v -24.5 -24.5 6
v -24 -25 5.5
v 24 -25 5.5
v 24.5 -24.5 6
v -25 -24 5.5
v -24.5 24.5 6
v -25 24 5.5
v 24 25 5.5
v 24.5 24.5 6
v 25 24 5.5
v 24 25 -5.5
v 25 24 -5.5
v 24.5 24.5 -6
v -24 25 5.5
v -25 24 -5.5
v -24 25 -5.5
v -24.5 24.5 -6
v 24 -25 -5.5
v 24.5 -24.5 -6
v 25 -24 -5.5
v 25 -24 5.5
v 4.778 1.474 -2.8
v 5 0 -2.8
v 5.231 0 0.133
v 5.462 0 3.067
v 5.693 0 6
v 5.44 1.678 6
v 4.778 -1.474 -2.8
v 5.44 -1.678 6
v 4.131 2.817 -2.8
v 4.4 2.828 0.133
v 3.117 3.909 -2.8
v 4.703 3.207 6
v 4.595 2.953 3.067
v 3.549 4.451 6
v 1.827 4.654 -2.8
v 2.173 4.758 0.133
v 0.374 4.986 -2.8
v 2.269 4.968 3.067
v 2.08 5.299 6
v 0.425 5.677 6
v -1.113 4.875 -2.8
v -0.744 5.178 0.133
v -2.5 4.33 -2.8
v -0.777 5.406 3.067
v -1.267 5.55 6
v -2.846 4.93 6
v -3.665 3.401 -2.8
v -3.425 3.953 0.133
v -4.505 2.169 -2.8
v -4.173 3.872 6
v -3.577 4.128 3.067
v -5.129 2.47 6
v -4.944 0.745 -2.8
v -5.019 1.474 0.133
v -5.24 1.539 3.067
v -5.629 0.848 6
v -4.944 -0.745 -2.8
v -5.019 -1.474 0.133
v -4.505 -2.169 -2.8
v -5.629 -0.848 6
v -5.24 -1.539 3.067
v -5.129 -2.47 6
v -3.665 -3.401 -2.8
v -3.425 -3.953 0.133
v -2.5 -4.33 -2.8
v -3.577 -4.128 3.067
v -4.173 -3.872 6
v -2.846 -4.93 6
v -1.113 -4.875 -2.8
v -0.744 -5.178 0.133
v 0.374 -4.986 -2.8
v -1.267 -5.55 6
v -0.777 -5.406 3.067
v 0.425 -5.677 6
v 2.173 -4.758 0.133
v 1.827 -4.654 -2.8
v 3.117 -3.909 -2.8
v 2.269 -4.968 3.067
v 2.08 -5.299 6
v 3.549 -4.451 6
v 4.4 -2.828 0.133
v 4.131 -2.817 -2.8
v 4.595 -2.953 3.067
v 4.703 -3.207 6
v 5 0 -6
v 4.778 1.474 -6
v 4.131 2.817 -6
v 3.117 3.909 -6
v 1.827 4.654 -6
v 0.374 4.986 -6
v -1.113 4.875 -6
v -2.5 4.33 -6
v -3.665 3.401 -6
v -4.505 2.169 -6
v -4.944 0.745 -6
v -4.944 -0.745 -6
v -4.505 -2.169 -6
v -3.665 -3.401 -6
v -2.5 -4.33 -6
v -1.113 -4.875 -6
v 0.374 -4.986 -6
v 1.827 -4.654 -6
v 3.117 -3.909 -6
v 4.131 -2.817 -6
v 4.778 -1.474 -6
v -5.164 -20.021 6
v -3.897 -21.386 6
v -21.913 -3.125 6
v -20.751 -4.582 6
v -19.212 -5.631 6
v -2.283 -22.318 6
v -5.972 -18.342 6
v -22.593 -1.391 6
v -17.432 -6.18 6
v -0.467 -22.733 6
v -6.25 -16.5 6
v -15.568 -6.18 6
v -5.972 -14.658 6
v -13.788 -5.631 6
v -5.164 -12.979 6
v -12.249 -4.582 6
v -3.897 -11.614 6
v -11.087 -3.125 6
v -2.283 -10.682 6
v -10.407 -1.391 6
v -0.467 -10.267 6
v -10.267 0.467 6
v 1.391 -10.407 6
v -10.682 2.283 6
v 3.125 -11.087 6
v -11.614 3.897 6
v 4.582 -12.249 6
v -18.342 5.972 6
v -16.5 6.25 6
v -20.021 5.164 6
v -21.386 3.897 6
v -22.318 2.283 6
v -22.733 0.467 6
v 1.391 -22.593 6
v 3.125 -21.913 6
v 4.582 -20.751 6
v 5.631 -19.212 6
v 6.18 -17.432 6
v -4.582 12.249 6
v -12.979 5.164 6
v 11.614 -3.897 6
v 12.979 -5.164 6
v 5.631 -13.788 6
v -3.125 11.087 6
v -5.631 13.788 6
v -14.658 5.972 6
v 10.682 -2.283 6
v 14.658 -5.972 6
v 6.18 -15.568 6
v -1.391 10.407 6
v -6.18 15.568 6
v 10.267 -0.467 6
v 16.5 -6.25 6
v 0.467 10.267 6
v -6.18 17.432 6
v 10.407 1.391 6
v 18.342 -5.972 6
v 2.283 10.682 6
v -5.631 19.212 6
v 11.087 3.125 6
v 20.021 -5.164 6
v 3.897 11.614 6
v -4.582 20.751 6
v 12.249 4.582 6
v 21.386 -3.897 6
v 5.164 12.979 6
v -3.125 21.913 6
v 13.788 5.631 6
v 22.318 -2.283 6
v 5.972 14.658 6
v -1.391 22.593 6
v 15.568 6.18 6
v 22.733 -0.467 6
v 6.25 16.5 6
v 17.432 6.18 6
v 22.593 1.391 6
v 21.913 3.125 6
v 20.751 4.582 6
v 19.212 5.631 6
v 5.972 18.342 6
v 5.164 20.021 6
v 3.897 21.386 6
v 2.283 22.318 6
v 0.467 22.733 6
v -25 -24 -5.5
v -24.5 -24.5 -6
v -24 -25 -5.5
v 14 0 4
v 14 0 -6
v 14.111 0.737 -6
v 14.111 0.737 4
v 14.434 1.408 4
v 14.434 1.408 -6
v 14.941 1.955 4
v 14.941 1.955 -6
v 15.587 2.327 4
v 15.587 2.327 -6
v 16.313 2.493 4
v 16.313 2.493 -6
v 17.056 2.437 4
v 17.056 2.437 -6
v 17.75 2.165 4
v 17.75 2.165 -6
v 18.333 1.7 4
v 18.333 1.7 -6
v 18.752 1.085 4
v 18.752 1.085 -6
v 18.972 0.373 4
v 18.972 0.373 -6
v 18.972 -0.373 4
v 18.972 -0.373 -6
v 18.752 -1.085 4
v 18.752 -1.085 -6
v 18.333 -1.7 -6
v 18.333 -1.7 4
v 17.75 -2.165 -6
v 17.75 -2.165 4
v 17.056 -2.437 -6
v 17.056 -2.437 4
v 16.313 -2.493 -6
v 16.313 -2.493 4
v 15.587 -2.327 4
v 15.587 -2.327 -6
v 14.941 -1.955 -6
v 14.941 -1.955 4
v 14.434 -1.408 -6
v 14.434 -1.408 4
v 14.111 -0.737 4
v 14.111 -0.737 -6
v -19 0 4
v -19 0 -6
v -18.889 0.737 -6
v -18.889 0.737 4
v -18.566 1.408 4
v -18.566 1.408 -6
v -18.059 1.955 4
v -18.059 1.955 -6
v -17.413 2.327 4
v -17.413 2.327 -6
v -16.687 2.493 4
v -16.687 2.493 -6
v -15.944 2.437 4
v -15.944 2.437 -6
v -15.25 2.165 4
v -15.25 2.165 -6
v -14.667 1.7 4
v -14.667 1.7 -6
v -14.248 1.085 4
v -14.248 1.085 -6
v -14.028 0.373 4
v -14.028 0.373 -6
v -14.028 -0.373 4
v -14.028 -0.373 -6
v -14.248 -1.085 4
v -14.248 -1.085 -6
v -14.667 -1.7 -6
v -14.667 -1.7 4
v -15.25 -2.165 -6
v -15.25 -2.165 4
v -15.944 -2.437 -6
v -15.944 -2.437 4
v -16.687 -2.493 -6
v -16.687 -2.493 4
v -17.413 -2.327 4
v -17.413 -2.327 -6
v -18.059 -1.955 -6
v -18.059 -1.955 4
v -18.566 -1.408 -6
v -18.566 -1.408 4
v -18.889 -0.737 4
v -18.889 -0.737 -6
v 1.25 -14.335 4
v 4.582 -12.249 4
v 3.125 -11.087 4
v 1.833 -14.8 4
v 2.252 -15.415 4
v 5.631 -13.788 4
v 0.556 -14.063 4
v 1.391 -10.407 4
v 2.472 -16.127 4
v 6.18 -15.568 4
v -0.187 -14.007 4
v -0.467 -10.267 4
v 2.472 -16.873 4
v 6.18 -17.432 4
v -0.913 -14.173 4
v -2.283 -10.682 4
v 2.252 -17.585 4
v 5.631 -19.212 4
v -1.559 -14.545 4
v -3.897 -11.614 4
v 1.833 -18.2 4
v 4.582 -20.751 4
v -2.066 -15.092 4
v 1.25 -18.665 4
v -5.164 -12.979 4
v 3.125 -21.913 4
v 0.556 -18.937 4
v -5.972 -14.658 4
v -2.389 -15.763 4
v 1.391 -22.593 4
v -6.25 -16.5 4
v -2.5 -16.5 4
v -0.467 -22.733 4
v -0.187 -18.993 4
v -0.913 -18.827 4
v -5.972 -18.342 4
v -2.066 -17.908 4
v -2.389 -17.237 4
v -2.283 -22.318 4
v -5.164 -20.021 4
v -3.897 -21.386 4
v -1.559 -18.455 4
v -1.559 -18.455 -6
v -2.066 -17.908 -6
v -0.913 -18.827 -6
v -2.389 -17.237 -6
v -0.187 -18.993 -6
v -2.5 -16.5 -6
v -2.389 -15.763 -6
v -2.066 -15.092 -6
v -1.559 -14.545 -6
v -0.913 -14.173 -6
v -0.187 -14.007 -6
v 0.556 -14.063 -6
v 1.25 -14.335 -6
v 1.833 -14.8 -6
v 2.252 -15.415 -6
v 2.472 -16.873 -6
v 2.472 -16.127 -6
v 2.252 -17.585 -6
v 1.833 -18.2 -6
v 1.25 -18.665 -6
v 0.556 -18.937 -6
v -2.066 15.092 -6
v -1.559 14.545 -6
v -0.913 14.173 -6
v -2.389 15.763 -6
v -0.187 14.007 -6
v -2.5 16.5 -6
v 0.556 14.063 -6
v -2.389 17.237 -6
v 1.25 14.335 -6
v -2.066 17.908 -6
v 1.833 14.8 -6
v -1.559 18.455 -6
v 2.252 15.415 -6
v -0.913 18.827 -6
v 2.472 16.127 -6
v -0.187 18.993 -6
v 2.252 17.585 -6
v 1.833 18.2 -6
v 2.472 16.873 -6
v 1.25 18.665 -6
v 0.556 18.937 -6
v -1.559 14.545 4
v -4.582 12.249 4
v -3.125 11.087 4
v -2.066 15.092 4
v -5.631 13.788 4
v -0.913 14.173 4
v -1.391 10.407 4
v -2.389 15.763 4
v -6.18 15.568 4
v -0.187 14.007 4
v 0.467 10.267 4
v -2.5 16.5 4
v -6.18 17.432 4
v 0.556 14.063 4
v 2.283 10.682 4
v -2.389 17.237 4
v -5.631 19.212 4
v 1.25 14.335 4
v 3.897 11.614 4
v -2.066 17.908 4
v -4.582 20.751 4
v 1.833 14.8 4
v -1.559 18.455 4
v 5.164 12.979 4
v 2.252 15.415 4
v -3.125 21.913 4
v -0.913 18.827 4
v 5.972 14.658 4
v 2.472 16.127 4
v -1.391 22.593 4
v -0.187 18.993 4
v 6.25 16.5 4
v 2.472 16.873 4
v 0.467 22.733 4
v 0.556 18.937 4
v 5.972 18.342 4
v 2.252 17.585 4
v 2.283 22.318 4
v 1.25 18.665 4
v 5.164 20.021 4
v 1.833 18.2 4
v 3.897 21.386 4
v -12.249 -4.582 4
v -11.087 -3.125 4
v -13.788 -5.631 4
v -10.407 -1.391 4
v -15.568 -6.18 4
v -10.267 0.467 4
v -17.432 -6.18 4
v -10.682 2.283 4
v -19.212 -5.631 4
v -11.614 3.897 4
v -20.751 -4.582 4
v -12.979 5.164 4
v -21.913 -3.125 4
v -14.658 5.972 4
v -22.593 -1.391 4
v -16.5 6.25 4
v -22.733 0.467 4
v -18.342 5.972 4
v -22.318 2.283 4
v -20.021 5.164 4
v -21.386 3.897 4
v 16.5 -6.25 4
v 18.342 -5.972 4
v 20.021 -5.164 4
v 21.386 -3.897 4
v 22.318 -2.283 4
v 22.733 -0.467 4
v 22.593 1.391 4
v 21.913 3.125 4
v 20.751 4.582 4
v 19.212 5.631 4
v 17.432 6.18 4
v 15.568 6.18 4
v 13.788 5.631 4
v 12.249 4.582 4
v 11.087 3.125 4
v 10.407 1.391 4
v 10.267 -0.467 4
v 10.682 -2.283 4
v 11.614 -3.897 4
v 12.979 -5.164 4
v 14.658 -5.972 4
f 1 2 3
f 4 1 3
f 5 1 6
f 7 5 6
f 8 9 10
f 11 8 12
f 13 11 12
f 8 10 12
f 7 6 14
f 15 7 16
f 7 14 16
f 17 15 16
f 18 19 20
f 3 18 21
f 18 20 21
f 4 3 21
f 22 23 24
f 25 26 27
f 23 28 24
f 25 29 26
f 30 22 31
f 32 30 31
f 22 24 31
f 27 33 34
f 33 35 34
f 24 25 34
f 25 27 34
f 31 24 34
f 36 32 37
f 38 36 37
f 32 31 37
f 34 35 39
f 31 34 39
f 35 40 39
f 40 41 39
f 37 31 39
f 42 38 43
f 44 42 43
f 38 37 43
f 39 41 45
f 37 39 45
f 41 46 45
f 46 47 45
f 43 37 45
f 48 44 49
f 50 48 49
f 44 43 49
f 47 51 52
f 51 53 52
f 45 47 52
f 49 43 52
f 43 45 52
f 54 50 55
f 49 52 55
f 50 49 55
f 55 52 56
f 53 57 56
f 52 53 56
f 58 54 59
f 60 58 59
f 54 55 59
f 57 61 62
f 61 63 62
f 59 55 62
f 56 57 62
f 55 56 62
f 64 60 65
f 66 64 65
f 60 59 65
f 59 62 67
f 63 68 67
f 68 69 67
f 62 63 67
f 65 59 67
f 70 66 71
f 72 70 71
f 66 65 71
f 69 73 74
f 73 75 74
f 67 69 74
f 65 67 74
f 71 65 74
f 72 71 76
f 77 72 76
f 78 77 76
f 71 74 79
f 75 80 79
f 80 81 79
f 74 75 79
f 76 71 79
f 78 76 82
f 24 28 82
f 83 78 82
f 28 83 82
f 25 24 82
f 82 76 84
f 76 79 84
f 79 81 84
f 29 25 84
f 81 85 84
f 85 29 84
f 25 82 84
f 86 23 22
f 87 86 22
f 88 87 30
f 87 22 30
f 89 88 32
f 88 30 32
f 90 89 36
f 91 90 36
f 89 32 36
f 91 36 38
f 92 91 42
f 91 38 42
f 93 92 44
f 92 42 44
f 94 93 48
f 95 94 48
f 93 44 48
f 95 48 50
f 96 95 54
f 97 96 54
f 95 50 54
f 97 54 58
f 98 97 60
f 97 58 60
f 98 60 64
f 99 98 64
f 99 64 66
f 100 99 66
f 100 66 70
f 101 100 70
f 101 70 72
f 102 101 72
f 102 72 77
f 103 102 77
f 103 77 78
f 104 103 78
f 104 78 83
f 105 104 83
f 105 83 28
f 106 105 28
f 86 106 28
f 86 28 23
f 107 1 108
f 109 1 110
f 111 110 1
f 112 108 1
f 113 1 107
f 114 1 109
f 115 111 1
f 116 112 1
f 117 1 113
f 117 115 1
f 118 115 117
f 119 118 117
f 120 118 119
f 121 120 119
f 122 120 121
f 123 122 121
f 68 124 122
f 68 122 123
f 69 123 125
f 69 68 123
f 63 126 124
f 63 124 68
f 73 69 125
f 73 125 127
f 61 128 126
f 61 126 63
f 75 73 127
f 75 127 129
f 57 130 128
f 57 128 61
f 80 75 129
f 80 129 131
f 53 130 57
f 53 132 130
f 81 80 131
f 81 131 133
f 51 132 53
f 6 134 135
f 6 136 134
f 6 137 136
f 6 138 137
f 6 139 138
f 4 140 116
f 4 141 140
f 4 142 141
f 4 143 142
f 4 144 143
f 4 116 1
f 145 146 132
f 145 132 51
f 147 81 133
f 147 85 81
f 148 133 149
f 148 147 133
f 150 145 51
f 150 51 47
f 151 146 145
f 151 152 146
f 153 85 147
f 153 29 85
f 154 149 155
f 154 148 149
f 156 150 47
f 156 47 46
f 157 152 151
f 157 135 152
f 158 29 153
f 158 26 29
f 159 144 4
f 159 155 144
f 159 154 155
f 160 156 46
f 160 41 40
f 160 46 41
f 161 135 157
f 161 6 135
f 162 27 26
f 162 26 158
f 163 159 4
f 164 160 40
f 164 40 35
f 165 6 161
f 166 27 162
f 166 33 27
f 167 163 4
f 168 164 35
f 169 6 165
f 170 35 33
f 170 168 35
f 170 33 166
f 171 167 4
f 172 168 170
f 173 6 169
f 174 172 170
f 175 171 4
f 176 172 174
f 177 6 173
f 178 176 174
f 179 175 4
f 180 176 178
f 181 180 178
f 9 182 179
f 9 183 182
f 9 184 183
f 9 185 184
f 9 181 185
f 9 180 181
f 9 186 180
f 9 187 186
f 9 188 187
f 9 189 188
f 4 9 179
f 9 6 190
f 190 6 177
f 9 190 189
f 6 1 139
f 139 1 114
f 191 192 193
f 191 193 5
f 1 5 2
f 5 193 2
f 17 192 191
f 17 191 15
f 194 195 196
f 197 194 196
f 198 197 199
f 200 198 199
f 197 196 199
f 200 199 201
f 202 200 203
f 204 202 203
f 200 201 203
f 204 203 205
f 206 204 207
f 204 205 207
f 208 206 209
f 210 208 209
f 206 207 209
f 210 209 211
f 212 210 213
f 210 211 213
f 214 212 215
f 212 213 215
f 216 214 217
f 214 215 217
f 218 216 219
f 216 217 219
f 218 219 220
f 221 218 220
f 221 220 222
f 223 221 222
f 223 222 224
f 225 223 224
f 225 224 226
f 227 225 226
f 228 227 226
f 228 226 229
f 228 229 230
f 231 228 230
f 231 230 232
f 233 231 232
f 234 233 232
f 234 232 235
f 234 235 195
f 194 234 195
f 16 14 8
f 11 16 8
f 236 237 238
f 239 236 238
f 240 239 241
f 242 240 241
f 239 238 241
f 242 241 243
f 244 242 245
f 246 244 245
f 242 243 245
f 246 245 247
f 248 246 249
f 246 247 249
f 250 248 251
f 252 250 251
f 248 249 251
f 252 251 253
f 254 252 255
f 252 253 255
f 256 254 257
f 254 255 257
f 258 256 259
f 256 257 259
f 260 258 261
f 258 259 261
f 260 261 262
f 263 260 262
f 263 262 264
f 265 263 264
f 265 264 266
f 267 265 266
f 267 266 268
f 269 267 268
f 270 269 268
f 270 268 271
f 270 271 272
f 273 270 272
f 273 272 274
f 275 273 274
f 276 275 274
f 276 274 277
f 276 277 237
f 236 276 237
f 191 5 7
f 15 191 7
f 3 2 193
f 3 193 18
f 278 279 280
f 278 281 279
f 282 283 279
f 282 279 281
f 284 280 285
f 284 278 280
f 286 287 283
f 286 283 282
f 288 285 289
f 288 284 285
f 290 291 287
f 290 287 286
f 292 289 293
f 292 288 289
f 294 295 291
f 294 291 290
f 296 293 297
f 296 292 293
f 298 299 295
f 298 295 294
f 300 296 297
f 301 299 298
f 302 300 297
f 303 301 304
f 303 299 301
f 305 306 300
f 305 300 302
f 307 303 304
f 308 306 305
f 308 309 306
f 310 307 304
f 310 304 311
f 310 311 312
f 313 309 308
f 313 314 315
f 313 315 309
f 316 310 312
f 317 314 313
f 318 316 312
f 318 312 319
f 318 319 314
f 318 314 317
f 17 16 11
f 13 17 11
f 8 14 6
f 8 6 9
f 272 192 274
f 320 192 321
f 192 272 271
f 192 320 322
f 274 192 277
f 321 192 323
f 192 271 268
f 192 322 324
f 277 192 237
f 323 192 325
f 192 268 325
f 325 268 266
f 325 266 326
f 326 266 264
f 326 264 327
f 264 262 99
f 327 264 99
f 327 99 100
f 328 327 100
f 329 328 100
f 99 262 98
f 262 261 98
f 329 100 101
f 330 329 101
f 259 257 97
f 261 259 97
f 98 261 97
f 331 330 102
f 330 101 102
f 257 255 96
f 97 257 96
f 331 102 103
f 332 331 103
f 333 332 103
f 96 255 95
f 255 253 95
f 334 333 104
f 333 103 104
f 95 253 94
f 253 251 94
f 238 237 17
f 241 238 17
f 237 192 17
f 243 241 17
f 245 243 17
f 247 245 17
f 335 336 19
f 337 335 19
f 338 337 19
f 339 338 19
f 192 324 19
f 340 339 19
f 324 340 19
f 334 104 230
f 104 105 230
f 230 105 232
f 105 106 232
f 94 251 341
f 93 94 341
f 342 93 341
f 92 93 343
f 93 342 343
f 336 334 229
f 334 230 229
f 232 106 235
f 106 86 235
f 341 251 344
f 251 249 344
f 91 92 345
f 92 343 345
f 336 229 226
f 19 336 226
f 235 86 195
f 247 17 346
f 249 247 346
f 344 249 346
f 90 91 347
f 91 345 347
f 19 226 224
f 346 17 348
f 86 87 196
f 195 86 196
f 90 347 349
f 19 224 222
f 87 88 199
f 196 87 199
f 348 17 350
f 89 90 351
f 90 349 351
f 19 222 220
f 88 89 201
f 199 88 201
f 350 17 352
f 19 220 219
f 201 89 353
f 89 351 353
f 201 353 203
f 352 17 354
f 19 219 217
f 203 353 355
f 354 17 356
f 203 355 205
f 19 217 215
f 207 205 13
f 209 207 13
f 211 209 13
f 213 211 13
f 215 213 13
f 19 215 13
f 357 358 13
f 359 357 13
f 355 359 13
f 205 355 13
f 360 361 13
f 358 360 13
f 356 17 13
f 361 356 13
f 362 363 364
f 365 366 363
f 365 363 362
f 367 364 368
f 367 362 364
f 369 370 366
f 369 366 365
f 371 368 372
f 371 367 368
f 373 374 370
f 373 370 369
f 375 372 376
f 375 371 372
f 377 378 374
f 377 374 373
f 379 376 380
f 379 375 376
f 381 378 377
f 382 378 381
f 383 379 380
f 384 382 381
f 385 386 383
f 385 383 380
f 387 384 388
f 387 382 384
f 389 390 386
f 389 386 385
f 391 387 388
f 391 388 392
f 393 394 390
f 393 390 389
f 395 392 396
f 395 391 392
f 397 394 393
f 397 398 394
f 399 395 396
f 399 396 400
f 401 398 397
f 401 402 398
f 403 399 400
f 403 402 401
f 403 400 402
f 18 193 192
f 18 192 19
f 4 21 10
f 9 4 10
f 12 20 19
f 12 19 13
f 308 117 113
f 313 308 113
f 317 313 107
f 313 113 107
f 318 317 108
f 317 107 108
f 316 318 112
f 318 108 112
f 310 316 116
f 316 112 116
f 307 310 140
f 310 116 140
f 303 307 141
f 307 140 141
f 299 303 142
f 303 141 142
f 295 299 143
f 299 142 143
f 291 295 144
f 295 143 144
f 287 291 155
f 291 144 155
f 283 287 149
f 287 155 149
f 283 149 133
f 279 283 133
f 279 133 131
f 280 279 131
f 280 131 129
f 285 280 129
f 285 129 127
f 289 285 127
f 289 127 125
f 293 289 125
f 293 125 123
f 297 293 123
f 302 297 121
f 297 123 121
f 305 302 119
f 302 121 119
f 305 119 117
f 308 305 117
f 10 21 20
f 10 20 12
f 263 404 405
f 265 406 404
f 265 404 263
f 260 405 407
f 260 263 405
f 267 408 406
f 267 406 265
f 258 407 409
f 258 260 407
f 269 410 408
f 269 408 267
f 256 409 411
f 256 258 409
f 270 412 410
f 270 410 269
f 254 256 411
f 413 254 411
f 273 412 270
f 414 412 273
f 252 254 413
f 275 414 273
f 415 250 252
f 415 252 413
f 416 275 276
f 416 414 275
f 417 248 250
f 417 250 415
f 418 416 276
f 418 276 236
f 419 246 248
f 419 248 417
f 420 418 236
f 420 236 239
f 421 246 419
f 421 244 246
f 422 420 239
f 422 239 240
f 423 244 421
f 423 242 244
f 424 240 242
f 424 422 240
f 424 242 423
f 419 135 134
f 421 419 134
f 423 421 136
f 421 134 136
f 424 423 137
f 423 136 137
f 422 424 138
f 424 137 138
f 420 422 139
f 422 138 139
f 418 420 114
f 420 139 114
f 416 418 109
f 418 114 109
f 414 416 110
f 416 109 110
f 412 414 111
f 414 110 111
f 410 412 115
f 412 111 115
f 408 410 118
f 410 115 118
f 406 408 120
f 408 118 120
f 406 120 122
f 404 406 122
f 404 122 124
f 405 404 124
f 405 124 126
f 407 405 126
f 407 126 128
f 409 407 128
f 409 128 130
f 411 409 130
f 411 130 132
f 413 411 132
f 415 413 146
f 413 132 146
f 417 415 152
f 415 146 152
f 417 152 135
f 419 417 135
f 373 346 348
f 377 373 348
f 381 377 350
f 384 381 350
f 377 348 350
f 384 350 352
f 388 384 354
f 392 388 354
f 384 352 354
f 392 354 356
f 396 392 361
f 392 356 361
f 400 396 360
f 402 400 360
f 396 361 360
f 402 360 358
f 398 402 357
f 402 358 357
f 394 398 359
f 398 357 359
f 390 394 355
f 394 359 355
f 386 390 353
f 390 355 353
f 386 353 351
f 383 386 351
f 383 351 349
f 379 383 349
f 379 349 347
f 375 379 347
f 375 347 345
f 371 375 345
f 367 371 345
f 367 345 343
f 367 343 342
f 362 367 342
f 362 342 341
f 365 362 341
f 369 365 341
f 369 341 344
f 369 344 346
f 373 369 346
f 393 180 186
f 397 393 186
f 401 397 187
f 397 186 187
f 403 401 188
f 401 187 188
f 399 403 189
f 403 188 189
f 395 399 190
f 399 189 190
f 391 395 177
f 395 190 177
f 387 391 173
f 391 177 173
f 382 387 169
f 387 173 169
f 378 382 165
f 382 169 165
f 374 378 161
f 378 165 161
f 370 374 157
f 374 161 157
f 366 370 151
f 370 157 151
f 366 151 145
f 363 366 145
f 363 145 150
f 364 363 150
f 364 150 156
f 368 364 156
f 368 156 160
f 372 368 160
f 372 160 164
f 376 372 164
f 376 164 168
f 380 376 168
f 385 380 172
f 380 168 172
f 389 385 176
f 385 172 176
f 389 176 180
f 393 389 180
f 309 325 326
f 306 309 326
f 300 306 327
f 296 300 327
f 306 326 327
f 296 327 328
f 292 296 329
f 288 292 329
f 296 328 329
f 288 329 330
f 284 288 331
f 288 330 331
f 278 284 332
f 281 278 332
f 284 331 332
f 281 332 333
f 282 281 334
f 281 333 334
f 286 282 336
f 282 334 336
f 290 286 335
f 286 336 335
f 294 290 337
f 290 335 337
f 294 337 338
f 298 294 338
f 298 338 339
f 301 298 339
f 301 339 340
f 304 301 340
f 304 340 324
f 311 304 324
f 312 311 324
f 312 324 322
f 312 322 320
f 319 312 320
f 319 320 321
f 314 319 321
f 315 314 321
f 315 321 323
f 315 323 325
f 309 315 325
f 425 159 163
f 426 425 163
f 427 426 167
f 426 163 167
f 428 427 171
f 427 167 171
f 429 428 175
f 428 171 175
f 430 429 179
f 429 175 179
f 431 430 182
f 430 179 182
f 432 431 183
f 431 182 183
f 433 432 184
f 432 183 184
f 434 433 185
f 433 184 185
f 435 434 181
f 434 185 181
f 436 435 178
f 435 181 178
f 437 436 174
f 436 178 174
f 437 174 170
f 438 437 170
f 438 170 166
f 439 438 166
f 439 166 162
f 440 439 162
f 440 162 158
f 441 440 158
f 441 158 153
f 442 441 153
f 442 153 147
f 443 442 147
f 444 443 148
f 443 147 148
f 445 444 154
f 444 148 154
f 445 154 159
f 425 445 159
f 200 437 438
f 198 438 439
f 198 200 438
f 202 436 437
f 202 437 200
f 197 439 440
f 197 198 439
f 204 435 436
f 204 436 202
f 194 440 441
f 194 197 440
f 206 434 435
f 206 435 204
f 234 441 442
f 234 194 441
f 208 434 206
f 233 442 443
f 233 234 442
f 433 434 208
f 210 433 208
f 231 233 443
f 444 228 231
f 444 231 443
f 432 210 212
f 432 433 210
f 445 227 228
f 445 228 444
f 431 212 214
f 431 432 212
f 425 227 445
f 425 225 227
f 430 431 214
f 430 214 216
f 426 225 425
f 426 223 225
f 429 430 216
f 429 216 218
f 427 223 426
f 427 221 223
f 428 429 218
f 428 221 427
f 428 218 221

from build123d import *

# Parameters (mm, degrees)
SKETCH1_W           = 50
SKETCH1_H           = 50
BOSS_EXTRUDE1_DEPTH = 6
CUT_EXTRUDE1_REACH  = 39.336
SKETCH5_R           = 5
CHAMFER1_SIZE       = 1
CHAMFER2_SIZE       = 0.5
M6_TAPPED_HOLE1_D   = 5
SKETCH10_R          = 6.25
CUT_EXTRUDE2_DEPTH  = 2
CIRPATTERN1_COUNT   = 4


# Read off the part's stored shape, not the designer's step: Draft1
with BuildPart() as part:
    # Sketch1 → Boss-Extrude1 (new, symmetric)
    with BuildSketch(Plane.XY):
        Rectangle(SKETCH1_W, SKETCH1_H)
    extrude(amount=BOSS_EXTRUDE1_DEPTH, both=True)

    # Sketch5 → Cut-Extrude1 (cut, up to next)
    with BuildSketch(Plane.XY.offset(6), mode=Mode.PRIVATE) as cut_extrude1_sk1:
        Circle(SKETCH5_R)
    cut_extrude1_tool1 = extrude(cut_extrude1_sk1.sketch, amount=-CUT_EXTRUDE1_REACH, mode=Mode.PRIVATE) & part.part
    add(cut_extrude1_tool1.solids().sort_by_distance((0, 0, 6))[0], mode=Mode.SUBTRACT)

    # Chamfer1
    chamfer1_edges = [part.edges().sort_by_distance(p)[0] for p in [
        (25, -25, 0),
        (-25, -25, 0),
        (-25, 25, 0),
        (25, 25, 0),
    ]]
    chamfer(chamfer1_edges, length=CHAMFER1_SIZE)

    # Chamfer2
    chamfer2_edges = [part.edges().sort_by_distance(p)[0] for p in [
        (0, -25, 6),
        (0, -25, -6),
        (0, 25, -6),
        (0, 25, 6),
        (25, 0, -6),
        (25, 0, 6),
        (-25, 0, -6),
        (-25, 0, 6),
    ]]
    chamfer(chamfer2_edges, length=CHAMFER2_SIZE - 0.0001)  # a hair under: the kernel refuses the full size

    # M6 Tapped Hole1 (through all)
    with Locations(Plane.XY.offset(6)):
        with Locations((-16.5, 0), (0, 16.5), (16.5, 0), (0, -16.5)):
            Hole(M6_TAPPED_HOLE1_D / 2)

    # Sketch10 → Cut-Extrude2 (cut)
    with BuildSketch(Plane.XY.offset(6)):
        with Locations((0, 16.5)):
            Circle(SKETCH10_R)
    cut_extrude2 = extrude(amount=-CUT_EXTRUDE2_DEPTH, mode=Mode.SUBTRACT)

    # CirPattern1: Cut-Extrude2 ×4 about axis
    cirpattern1_axis = Axis((0, 0, 0), (0, 0, 1))
    for i in range(1, CIRPATTERN1_COUNT):
        add(cut_extrude2.rotate(cirpattern1_axis, i * 360 / CIRPATTERN1_COUNT), mode=Mode.SUBTRACT)

    # Draft1 outline → Draft1 (revolve, cut)
    with BuildSketch(Plane.XZ):
        Polygon((5, 6), (5, -2.8), (5.69257502, 6), align=None)
    revolve(axis=Axis((0, 0, 0), (0, 0, 1)), mode=Mode.SUBTRACT)


solid = part.part
